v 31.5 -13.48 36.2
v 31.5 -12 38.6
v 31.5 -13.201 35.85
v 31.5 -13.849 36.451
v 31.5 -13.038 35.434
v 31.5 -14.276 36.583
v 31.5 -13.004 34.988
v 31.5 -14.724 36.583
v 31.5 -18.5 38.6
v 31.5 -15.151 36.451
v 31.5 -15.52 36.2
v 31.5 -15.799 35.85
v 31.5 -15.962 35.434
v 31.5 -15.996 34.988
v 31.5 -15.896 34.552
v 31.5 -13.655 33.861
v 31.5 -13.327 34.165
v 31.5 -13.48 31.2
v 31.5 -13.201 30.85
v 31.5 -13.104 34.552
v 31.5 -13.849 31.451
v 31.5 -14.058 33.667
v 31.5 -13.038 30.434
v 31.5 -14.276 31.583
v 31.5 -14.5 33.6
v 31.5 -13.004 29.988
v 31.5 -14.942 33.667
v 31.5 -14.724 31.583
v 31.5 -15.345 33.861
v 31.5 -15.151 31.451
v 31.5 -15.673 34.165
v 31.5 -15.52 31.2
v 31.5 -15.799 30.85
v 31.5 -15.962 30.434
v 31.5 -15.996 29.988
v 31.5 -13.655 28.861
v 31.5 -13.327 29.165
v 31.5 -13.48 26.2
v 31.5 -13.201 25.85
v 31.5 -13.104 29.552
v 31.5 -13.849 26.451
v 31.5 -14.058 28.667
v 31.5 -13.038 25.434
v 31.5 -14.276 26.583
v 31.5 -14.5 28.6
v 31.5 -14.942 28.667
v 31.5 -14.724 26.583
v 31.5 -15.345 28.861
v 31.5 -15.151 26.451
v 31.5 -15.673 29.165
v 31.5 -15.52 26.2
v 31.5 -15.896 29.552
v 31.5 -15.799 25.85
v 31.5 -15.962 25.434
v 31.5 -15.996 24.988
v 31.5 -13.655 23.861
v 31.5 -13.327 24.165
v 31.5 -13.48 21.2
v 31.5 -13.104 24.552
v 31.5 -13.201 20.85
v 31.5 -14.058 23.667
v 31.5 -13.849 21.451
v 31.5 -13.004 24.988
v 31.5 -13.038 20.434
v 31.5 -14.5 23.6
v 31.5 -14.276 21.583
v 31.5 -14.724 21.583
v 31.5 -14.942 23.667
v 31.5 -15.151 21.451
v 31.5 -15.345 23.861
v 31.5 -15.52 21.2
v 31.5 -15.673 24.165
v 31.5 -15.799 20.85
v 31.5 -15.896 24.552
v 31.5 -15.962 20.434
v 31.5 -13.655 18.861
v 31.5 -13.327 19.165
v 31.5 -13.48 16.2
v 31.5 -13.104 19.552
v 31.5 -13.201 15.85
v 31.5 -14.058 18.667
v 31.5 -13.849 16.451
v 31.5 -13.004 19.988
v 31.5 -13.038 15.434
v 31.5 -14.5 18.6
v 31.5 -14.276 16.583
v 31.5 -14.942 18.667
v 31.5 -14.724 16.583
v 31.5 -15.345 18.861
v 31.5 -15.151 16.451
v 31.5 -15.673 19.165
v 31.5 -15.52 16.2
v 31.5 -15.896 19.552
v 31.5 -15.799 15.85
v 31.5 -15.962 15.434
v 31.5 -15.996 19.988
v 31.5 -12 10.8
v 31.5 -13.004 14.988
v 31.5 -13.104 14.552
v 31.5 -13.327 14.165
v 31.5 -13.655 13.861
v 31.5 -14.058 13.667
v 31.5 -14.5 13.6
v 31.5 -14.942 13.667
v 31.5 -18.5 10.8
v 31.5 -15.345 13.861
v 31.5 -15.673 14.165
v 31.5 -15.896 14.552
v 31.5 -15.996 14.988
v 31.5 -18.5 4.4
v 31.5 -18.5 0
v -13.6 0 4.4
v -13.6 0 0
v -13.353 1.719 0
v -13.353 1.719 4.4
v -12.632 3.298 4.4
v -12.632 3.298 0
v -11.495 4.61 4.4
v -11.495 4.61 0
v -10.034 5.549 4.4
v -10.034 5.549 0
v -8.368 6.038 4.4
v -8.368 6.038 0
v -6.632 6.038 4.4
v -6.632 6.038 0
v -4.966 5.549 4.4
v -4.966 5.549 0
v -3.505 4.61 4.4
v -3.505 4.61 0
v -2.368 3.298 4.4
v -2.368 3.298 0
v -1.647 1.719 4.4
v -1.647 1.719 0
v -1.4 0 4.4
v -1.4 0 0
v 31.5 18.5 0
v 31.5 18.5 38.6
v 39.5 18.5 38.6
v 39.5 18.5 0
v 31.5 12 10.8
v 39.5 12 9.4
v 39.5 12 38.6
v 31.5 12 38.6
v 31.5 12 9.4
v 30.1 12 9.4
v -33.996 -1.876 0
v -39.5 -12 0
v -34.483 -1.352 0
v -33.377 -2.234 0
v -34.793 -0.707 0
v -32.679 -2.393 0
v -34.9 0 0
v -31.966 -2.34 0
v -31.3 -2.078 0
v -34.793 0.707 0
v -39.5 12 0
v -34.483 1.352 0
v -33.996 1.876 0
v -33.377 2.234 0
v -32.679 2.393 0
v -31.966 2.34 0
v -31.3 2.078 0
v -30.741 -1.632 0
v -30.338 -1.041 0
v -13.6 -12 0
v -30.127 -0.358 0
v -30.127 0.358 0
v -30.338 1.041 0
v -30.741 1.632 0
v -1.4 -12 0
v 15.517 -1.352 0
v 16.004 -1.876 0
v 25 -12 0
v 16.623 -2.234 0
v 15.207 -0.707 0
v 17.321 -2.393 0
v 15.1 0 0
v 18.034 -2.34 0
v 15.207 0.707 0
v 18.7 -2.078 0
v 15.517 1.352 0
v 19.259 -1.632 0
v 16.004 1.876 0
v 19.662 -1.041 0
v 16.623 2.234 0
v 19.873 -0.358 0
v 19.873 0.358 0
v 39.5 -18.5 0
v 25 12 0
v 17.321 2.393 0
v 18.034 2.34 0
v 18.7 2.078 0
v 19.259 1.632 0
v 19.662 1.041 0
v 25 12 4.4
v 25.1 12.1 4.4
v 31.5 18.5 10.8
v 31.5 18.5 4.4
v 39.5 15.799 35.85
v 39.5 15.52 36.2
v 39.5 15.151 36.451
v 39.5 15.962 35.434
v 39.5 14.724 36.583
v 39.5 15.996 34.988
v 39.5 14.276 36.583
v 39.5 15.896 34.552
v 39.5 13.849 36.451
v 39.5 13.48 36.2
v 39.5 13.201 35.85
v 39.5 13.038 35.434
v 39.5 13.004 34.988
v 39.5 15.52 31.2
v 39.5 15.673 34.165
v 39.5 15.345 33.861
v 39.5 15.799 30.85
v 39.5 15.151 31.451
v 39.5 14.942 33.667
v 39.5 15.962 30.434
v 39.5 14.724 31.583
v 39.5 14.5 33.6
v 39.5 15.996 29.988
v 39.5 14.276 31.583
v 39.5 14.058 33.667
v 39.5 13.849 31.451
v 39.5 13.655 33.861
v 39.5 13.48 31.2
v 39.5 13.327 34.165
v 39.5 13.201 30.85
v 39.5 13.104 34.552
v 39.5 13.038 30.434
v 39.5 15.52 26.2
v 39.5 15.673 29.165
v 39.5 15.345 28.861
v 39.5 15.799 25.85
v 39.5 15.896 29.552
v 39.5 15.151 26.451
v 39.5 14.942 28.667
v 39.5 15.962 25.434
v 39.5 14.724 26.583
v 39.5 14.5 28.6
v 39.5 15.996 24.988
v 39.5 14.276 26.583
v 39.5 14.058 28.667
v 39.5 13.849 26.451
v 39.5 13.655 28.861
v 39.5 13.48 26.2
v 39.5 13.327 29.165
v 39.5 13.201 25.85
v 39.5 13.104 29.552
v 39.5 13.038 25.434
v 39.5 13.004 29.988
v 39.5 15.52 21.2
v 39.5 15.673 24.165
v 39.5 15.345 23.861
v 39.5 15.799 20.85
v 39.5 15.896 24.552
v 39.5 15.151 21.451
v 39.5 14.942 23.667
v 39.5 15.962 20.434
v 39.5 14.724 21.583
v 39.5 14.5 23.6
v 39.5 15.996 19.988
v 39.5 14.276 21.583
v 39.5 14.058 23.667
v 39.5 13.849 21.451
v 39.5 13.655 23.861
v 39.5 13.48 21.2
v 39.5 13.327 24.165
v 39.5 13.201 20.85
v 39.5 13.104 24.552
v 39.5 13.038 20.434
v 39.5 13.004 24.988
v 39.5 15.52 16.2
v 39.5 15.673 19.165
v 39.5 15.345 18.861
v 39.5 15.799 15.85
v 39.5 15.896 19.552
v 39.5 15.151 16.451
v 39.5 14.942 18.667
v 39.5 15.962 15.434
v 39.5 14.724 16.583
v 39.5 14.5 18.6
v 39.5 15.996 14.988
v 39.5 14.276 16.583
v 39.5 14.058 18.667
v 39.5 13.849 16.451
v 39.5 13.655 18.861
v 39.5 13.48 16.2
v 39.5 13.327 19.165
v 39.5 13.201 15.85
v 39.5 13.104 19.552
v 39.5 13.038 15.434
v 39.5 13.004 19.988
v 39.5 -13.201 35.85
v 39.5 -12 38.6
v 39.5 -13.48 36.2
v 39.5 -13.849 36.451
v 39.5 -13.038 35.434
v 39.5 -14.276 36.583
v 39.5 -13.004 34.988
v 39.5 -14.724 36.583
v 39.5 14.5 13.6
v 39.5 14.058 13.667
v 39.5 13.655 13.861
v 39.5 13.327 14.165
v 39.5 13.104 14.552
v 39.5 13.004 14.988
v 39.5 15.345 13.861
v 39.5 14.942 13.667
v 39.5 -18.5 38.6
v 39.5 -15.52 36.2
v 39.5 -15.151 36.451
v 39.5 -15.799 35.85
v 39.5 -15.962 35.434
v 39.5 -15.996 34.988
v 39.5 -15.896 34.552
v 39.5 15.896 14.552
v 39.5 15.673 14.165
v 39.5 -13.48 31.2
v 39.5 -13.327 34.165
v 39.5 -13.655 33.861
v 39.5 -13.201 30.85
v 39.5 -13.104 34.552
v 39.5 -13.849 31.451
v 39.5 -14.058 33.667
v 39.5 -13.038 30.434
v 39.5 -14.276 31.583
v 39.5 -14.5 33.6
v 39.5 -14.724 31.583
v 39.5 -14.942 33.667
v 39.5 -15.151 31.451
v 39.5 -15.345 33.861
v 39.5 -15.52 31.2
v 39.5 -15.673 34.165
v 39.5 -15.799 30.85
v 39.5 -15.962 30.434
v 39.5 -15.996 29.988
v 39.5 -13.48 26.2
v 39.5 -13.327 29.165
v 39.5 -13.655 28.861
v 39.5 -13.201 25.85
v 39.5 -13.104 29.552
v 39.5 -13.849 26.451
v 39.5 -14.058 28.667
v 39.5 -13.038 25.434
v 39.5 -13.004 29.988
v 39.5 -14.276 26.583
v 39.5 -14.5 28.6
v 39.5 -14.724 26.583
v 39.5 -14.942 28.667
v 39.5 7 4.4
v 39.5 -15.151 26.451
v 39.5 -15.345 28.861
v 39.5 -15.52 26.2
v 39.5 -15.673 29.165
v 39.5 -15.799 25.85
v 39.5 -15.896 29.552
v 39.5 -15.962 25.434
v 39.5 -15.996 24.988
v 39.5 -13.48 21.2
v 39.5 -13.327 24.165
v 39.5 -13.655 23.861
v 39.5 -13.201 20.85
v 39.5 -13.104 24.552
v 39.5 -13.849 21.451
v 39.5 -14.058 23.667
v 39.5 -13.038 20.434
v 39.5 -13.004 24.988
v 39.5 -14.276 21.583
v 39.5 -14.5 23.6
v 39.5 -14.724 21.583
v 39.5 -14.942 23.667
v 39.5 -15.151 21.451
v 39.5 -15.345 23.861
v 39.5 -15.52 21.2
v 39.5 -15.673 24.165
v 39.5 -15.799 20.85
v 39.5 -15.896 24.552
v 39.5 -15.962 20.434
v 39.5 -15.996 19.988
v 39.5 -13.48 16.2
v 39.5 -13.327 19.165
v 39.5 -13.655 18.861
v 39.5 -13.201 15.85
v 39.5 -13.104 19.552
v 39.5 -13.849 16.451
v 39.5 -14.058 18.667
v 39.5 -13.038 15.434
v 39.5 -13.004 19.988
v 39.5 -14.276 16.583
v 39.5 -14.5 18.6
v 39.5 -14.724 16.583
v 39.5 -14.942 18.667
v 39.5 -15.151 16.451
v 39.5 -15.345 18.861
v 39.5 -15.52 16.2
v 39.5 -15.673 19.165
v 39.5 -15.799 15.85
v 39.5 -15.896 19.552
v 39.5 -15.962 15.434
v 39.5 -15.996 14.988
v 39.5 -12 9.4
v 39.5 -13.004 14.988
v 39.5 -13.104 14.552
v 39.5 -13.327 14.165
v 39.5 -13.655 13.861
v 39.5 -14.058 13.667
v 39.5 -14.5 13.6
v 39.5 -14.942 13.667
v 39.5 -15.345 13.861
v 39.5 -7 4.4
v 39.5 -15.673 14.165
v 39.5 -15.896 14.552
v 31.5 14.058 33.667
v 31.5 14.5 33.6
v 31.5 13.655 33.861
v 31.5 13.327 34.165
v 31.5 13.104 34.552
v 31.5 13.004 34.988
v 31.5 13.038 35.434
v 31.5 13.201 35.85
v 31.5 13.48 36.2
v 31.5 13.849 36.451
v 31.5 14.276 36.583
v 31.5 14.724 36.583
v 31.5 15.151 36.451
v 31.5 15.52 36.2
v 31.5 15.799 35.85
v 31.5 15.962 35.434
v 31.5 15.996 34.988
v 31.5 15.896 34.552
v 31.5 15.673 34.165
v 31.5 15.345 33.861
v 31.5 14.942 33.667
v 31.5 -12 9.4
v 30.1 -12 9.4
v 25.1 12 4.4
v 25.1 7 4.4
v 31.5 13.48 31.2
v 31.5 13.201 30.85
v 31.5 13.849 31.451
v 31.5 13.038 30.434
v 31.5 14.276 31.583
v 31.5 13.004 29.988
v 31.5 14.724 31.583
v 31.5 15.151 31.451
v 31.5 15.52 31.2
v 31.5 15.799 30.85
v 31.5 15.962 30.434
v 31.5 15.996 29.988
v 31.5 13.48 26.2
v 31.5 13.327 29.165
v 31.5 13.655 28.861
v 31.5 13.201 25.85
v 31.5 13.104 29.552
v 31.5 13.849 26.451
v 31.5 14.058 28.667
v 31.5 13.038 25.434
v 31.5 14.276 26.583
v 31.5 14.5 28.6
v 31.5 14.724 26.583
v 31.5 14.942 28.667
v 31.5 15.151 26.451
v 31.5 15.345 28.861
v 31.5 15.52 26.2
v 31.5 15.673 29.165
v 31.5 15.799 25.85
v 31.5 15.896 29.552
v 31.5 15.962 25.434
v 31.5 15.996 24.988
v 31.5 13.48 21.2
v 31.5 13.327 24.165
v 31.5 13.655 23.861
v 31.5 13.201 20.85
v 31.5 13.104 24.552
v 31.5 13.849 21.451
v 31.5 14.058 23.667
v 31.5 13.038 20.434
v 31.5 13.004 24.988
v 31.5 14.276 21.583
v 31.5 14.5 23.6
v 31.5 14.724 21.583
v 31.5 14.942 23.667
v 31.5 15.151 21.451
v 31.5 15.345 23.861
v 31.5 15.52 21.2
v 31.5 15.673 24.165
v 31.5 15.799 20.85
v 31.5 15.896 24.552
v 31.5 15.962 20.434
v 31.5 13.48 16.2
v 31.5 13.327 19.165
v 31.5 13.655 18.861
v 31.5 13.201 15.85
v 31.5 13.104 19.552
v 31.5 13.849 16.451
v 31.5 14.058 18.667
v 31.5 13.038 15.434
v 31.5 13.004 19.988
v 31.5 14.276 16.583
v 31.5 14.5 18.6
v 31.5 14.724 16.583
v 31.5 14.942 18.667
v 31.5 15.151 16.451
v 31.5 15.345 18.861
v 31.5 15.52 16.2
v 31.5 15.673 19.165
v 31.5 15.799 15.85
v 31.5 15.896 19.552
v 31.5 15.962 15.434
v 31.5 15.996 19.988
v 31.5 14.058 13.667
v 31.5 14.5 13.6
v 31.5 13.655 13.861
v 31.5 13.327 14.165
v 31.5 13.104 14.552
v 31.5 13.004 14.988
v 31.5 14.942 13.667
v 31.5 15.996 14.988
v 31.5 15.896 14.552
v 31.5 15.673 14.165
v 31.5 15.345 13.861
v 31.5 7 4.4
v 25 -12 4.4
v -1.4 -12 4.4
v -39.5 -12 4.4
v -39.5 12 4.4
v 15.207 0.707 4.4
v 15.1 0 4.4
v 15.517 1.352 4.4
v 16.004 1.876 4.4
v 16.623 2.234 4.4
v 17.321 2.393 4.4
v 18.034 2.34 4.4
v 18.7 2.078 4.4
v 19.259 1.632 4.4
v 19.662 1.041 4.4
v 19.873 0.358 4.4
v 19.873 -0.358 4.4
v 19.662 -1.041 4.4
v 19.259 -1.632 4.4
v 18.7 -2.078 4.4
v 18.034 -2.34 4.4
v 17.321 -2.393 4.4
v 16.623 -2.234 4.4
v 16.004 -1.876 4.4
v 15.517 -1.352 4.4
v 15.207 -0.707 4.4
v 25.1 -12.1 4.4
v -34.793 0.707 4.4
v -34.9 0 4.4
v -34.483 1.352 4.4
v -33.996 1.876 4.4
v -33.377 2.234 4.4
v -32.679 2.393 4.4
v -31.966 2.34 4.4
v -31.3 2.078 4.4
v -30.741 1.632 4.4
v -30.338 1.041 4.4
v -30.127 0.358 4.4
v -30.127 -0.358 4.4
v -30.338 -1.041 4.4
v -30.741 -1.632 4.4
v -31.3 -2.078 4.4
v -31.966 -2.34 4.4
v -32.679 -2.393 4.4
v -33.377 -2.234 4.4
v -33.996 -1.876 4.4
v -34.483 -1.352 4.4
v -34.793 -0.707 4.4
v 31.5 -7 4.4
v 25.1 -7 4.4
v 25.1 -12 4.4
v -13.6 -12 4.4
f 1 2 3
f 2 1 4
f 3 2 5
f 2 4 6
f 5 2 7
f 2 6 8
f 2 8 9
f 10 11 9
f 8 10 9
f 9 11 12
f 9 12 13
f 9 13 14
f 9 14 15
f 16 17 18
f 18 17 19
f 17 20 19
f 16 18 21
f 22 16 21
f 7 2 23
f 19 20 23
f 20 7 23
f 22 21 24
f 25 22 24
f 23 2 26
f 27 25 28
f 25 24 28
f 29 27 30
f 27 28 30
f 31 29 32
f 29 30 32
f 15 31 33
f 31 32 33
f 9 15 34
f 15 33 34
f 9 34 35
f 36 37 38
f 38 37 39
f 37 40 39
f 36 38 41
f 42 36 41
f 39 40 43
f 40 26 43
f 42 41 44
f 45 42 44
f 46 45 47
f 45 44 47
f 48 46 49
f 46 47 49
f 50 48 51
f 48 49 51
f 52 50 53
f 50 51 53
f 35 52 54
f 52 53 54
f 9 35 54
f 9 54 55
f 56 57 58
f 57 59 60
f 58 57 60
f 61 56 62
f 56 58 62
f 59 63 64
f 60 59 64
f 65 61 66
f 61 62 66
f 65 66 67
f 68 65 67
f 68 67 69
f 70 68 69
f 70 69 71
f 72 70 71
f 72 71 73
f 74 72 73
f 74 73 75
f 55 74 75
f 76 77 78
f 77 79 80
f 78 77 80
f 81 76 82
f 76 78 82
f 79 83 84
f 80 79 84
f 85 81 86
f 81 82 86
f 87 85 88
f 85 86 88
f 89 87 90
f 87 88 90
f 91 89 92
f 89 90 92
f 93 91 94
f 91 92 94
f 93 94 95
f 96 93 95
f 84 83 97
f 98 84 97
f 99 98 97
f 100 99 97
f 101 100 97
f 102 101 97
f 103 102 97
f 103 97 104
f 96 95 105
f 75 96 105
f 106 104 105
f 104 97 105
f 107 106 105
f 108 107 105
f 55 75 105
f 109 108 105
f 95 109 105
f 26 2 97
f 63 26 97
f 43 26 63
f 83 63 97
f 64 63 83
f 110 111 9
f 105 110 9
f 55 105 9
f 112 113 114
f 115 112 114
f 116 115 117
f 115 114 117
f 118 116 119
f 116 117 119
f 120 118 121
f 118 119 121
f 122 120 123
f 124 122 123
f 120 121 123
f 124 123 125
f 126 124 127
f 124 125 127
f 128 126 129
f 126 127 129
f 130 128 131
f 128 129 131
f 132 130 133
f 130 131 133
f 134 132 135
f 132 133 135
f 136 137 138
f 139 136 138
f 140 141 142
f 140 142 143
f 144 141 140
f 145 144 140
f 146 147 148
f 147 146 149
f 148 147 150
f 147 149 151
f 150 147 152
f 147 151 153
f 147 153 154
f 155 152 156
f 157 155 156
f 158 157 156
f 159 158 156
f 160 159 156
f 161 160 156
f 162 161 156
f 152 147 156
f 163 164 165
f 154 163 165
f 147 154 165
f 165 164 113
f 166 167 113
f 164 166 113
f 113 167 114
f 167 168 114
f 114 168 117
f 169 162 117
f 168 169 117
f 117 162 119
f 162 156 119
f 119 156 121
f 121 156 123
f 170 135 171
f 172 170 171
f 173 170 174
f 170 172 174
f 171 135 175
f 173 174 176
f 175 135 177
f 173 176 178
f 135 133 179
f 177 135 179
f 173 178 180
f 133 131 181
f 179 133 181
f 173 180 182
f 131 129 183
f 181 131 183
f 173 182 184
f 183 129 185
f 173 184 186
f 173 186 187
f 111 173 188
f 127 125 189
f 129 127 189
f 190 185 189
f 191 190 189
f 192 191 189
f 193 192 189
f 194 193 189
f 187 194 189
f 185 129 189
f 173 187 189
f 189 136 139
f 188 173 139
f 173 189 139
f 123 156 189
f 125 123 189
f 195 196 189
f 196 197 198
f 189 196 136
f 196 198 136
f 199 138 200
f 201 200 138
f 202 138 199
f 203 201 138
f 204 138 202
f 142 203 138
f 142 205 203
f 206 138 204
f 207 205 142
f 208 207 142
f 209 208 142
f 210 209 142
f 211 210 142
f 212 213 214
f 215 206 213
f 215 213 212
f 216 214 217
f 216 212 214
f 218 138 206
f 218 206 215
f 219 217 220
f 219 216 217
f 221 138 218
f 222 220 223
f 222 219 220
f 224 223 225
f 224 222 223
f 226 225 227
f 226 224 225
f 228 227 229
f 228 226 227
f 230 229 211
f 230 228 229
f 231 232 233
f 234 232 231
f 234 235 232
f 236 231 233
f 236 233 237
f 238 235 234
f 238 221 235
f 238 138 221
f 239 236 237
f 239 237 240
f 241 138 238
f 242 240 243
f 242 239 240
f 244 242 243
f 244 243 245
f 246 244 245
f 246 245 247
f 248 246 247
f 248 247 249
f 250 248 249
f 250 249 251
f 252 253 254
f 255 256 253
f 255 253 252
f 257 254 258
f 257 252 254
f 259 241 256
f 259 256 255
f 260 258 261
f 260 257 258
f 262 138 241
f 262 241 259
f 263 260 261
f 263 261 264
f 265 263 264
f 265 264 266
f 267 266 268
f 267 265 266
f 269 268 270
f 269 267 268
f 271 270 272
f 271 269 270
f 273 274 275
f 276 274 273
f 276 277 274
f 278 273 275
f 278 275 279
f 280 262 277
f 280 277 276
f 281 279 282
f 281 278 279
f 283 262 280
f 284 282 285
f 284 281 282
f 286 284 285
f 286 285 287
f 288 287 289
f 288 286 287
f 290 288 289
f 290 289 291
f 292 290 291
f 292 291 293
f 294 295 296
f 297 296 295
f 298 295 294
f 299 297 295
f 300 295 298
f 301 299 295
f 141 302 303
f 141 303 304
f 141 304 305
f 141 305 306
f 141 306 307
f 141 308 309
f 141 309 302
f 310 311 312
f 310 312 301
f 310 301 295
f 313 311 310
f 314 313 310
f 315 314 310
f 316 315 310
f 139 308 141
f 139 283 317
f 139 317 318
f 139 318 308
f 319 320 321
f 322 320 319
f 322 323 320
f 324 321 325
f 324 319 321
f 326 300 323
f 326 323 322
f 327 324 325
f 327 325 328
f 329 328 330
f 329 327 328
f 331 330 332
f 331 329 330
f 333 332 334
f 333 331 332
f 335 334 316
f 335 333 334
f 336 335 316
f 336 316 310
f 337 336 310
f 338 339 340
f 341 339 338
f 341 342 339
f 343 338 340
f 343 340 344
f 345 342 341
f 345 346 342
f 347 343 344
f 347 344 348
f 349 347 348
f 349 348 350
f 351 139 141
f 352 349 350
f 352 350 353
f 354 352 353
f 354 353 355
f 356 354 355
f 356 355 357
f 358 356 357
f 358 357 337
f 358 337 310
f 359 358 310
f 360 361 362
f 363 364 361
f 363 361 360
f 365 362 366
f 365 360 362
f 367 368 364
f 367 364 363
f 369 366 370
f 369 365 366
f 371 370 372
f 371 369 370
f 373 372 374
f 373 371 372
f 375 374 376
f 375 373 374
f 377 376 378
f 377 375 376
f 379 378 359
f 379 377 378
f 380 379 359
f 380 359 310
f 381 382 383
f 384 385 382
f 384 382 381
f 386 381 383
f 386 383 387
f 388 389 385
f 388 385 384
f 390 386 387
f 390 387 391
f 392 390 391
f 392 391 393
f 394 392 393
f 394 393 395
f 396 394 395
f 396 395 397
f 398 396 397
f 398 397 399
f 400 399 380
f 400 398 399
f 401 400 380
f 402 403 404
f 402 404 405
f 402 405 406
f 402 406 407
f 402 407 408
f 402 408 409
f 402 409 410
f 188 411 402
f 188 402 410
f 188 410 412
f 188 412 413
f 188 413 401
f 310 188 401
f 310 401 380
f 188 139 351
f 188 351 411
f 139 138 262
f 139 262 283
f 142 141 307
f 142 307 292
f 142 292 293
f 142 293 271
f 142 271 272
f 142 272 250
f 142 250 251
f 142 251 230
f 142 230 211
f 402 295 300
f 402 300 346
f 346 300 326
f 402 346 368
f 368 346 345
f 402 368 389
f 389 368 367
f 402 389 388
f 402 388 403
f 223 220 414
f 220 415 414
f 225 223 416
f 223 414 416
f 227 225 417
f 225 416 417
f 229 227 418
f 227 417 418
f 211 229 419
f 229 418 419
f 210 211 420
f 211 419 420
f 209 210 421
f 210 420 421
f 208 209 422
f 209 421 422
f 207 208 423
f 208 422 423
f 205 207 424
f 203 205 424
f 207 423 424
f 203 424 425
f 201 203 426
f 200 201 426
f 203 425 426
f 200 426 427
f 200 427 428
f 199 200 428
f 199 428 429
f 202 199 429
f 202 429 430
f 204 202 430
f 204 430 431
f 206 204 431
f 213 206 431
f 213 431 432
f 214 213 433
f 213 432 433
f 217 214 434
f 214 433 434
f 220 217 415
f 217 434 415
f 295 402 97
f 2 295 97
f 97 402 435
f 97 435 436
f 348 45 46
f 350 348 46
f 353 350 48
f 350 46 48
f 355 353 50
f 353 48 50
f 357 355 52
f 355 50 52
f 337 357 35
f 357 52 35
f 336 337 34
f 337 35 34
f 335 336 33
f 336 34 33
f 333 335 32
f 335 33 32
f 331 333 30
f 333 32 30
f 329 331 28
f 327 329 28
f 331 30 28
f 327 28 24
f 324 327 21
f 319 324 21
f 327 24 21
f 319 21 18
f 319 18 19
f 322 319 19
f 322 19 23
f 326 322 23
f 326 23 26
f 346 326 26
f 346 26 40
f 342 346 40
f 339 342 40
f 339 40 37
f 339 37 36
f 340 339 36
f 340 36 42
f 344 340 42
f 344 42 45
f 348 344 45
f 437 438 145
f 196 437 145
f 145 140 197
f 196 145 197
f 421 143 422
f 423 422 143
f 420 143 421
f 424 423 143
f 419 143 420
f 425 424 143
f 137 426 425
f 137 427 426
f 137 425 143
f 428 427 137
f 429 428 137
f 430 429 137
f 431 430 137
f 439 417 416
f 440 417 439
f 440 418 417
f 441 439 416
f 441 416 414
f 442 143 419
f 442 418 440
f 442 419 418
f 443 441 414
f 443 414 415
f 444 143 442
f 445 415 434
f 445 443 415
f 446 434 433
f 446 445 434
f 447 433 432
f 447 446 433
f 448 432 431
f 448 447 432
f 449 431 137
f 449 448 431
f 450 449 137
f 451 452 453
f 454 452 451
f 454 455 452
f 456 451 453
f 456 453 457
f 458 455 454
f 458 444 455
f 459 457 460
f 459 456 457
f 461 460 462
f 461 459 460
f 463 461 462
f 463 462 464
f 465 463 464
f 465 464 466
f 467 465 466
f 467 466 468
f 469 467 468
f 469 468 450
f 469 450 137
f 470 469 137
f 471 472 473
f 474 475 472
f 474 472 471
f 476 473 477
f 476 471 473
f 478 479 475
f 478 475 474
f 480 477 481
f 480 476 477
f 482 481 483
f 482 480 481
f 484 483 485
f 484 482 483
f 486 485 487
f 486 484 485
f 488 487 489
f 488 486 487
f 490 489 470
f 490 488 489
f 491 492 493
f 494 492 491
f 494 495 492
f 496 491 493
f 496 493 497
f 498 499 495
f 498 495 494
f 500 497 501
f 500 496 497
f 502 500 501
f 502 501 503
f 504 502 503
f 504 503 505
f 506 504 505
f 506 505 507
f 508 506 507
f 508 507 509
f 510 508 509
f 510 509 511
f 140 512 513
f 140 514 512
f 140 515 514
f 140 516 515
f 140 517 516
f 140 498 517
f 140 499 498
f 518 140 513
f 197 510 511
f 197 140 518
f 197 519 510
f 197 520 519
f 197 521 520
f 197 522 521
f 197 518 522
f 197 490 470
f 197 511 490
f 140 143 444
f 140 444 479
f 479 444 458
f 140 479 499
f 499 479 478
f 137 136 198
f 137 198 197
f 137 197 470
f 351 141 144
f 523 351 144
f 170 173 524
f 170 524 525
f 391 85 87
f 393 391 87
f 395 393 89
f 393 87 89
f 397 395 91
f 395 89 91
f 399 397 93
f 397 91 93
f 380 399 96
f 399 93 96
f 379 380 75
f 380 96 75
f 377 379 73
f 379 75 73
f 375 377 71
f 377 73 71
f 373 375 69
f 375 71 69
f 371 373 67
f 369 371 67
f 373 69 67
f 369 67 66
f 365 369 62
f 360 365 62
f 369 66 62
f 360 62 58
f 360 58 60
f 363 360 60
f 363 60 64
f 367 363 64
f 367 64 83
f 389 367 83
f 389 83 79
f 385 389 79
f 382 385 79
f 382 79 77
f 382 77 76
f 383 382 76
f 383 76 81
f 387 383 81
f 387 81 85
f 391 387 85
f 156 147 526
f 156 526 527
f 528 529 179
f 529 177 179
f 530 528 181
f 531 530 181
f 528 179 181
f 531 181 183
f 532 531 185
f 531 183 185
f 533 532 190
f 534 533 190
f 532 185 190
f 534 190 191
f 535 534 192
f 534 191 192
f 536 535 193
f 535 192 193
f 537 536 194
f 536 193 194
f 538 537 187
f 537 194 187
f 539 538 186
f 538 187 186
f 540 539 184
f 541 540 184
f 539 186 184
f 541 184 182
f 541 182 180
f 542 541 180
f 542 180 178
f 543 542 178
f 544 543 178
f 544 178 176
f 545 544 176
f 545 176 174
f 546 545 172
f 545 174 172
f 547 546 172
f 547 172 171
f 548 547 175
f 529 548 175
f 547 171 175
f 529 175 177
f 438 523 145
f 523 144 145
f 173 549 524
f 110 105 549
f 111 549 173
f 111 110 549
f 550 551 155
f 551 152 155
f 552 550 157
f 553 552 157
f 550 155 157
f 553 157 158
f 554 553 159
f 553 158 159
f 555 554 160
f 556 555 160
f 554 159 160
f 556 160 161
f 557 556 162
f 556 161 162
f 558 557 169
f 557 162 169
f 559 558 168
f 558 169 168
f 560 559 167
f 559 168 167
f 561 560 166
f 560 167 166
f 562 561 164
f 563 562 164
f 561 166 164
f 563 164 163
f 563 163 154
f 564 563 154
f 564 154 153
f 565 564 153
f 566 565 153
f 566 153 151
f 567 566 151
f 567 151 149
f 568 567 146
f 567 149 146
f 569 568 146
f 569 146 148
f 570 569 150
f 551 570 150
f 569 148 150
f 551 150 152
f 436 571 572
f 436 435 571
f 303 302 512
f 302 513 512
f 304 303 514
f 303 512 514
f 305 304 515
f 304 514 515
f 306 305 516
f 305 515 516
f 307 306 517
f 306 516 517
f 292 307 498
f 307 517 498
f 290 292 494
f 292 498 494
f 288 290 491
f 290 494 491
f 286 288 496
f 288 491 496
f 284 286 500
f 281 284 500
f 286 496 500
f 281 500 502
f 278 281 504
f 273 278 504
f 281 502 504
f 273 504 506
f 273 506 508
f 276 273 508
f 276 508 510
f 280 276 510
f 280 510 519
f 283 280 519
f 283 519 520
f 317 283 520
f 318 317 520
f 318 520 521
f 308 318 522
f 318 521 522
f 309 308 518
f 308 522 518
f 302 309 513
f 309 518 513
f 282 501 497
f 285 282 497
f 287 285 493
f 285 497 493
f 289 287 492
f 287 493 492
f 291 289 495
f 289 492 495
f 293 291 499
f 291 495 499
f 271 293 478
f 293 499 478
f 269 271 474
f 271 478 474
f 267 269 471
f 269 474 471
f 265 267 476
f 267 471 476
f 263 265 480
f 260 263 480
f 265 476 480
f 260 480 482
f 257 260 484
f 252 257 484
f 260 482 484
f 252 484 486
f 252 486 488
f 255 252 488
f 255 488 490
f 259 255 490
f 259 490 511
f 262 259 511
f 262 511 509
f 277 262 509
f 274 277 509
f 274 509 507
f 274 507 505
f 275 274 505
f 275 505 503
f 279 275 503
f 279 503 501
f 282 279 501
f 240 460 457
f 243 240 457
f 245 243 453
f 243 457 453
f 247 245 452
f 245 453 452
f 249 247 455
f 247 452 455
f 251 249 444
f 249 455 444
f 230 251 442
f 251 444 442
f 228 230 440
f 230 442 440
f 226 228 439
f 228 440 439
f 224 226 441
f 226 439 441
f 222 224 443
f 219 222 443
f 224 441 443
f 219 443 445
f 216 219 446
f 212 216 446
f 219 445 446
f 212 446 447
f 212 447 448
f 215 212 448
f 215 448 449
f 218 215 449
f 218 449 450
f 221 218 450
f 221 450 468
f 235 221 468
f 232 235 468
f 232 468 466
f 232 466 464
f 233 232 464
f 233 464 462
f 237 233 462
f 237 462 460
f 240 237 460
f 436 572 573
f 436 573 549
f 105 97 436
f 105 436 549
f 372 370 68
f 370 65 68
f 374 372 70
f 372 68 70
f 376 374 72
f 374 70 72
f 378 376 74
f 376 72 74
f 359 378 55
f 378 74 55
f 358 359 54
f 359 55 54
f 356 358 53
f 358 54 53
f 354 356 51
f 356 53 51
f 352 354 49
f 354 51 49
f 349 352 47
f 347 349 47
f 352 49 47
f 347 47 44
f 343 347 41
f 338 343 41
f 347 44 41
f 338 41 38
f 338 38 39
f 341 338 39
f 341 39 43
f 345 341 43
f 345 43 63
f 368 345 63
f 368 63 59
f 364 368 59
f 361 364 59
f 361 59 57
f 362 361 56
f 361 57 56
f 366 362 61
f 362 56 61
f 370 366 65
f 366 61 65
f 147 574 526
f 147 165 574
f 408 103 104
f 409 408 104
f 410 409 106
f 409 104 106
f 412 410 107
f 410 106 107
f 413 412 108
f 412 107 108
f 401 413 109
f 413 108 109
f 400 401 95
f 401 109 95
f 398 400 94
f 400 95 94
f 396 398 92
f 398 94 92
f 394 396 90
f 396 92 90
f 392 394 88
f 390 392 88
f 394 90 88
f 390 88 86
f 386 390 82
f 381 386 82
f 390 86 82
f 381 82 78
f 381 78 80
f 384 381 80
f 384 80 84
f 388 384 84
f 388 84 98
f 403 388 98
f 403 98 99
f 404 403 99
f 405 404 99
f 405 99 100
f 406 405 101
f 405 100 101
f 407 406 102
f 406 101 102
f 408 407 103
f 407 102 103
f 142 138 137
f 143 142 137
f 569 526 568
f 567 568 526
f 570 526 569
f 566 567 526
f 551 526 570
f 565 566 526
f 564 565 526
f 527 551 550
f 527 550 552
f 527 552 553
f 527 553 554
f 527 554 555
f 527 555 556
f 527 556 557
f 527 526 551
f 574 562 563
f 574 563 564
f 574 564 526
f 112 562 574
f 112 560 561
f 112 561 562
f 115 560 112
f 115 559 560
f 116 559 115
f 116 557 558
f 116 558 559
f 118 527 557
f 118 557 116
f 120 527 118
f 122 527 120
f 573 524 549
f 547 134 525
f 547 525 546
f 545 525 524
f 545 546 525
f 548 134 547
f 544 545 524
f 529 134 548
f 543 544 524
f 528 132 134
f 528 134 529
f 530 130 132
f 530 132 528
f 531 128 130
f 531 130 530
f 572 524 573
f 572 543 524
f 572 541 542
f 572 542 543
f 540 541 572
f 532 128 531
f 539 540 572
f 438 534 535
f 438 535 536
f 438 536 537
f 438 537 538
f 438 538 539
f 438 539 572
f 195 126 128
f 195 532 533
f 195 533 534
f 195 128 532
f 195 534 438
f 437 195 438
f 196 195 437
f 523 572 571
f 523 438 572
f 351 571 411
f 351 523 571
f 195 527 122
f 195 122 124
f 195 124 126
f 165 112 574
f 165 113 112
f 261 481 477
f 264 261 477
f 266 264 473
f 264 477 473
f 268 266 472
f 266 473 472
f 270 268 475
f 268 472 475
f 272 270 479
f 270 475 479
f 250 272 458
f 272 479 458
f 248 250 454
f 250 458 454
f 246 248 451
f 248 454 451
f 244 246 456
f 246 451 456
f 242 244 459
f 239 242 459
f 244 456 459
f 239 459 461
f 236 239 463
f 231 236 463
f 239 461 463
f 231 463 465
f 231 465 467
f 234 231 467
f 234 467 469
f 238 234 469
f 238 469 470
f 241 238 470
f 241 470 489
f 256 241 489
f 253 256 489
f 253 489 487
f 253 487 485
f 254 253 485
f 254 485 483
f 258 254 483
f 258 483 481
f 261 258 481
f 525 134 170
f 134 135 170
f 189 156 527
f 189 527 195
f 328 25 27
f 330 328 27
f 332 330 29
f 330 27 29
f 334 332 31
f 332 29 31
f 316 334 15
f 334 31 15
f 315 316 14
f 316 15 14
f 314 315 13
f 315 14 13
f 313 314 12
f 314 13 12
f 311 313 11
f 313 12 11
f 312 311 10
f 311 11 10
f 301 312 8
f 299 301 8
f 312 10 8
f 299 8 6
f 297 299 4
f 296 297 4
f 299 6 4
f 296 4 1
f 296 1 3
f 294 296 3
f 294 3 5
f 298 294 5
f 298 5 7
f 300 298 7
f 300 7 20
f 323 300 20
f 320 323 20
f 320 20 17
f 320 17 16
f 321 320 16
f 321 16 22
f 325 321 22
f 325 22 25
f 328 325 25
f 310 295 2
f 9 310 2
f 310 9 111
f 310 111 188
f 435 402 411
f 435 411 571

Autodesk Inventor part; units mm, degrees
ref_plane "YZ Plane" through (0, 0, 0) normal (1, 0, 0) x (0, 1, 0)
ref_plane "XZ Plane" through (0, 0, 0) normal (0, 1, 0) x (-1, 0, 0)
ref_plane "XY Plane" through (0, 0, 0) normal (0, 0, 1) x (1, 0, 0)
sketch "Sketch1" plane through (0, 0, 0) normal (0, 0, 1) x (1, 0, 0)
  line L0 (-39.5, 12) -> (39.5, 12)
  line L1 (39.5, 12) -> (39.5, -12)
  line L2 (39.5, -12) -> (-39.5, -12)
  line L3 (-39.5, -12) -> (-39.5, 12)
  line L4 (-39.5, 12) -> (39.5, -12) construction
  line L5 (39.5, 12) -> (-39.5, -12) construction
  point P0 (0, 0)
  dimension "d0" = 79
  dimension "d1" = 24
extrude "Extrusion1" add sketch "Sketch1" along normal blind 4.4
sketch "Sketch3" plane through (0, 0, 0) normal (0, 0, -1) x (-1, 0, 0)
  line L0 (-39.5, 12) -> (-31.5, 12)
  line L1 (-31.5, 12) -> (-31.5, 18.5)
  line L2 (-31.5, 18.5) -> (-39.5, 18.5)
  line L3 (-39.5, 18.5) -> (-39.5, 12)
  line L4 (-39.5, -12) -> (-31.5, -12)
  line L5 (-31.5, -12) -> (-31.5, -18.5)
  line L6 (-31.5, -18.5) -> (-39.5, -18.5)
  line L7 (-39.5, -18.5) -> (-39.5, -12)
  point P0 (0, 0)
  dimension "d8" = 8
  dimension "d9" = 6.5
  dimension "d10" = 6.5
extrude "Extrusion2" add sketch "Sketch3" against normal blind 38.6
chamfer "Chamfer1" distance 6.5 angle 45 2 edges at (31.5, -12, 2.2) (31.5, 12, 2.2)
sketch "Sketch5" plane through (0, 0, 0) normal (0, 0, -1) x (-1, 0, 0)
  line L0 (-25, -12) -> (39.5, -12) projected
  line L1 (39.5, 12) -> (-24.5, 12) construction
  line L2 (-24.5, 12) -> (-24.5, -12) construction
  line L3 (-24.5, -12) -> (39.5, -12) construction
  line L4 (39.5, -12) -> (39.5, 12) construction
  line L5 (-24.5, 12) -> (39.5, -12) construction
  line L6 (39.5, 12) -> (-24.5, -12) construction
  circle A0 centre (7.5, 0) radius 6.1
  line L7 (-17.5, 3) -> (32.5, 3) construction
  line L8 (32.5, 3) -> (32.5, -3) construction
  line L9 (32.5, -3) -> (-17.5, -3) construction
  line L10 (-17.5, -3) -> (-17.5, 3) construction
  line L11 (-17.5, 3) -> (32.5, -3) construction
  line L12 (32.5, 3) -> (-17.5, -3) construction
  circle A1 centre (-17.5, 0) radius 2.4
  circle A2 centre (32.5, 0) radius 2.4
  line L13 (1.4, 0) -> (1.4, -12)
  line L14 (13.6, 0) -> (13.6, -12)
  line L15 (13.6, -12) -> (1.4, -12)
  point P0 (0, 0)
  dimension "d29" = 64
  dimension "d30" = 12.2
  dimension "d31" = 50
  dimension "d32" = 4.8
  dimension "d33" = 4.8
extrude "Extrusion4" cut sketch "Sketch5" against normal blind 5.6
sketch "Sketch6" plane through (39.5, -18.5, 0) normal (1, 0, 0) x (0, 0, -1)
  line L0 (-38.6, 6.5) -> (-5.6, 6.5) construction
  line L1 (-5.6, 6.5) -> (-5.6, 1.5) construction
  line L2 (-5.6, 1.5) -> (-38.6, 1.5) construction
  line L3 (-38.6, 1.5) -> (-38.6, 6.5) construction
  line L4 (-38.6, 30.5) -> (-5.6, 30.5) construction
  line L5 (-5.6, 30.5) -> (-5.6, 35.5) construction
  line L6 (-5.6, 35.5) -> (-38.6, 35.5) construction
  line L7 (-38.6, 35.5) -> (-38.6, 30.5) construction
  line L8 (-38.6, 4) -> (-5.6, 4) construction
  line L9 (-38.6, 33) -> (-5.6, 33) construction
  line L10 (-38.6, 1.5) -> (-37.6, 1.5) construction
  line L11 (-37.6, 1.5) -> (-37.6, 6.5) construction
  line L12 (-37.6, 6.5) -> (-38.6, 6.5) construction
  line L13 (-38.6, 6.5) -> (-38.6, 1.5) construction
  line L14 (-37.6, 1.5) -> (-32.6, 1.5) construction
  line L15 (-32.6, 1.5) -> (-32.6, 6.5) construction
  line L16 (-32.6, 6.5) -> (-37.6, 6.5) construction
  line L17 (-37.6, 6.5) -> (-37.6, 1.5) construction
  line L18 (-38.6, 30.5) -> (-37.6, 30.5) construction
  line L19 (-37.6, 30.5) -> (-37.6, 35.5) construction
  line L20 (-37.6, 35.5) -> (-38.6, 35.5) construction
  line L21 (-38.6, 35.5) -> (-38.6, 30.5) construction
  line L22 (-37.6, 30.5) -> (-32.6, 30.5) construction
  line L23 (-32.6, 30.5) -> (-32.6, 35.5) construction
  line L24 (-32.6, 35.5) -> (-37.6, 35.5) construction
  line L25 (-37.6, 35.5) -> (-37.6, 30.5) construction
  line L26 (-37.6, 1.5) -> (-32.6, 6.5) construction
  line L27 (-37.6, 6.5) -> (-32.6, 1.5) construction
  line L28 (-37.6, 30.5) -> (-32.6, 35.5) construction
  line L29 (-37.6, 35.5) -> (-32.6, 30.5) construction
  line L30 (-38.6, 35.5) -> (-37.6, 35.5) construction
  line L31 (-37.6, 35.5) -> (-37.6, 30.5) construction
  line L32 (-37.6, 30.5) -> (-38.6, 30.5) construction
  line L33 (-38.6, 30.5) -> (-38.6, 35.5) construction
  line L34 (-4.4, 30.5) -> (-38.6, 30.5) projected
  line L35 (-32.6, 35.5) -> (-27.6, 35.5) construction
  line L36 (-27.6, 35.5) -> (-27.6, 30.5) construction
  line L37 (-27.6, 30.5) -> (-32.6, 30.5) construction
  line L38 (-32.6, 30.5) -> (-32.6, 35.5) construction
  line L39 (-27.6, 35.5) -> (-22.6, 35.5) construction
  line L40 (-22.6, 35.5) -> (-22.6, 30.5) construction
  line L41 (-22.6, 30.5) -> (-27.6, 30.5) construction
  line L42 (-27.6, 30.5) -> (-27.6, 35.5) construction
  line L43 (-32.6, 6.5) -> (-27.6, 6.5) construction
  line L44 (-27.6, 6.5) -> (-27.6, 1.5) construction
  line L45 (-27.6, 1.5) -> (-32.6, 1.5) construction
  line L46 (-32.6, 1.5) -> (-32.6, 6.5) construction
  line L47 (-27.6, 6.5) -> (-22.6, 6.5) construction
  line L48 (-22.6, 6.5) -> (-22.6, 1.5) construction
  line L49 (-22.6, 1.5) -> (-27.6, 1.5) construction
  line L50 (-27.6, 1.5) -> (-27.6, 6.5) construction
  line L51 (-22.6, 35.5) -> (-17.6, 35.5) construction
  line L52 (-17.6, 35.5) -> (-17.6, 30.5) construction
  line L53 (-17.6, 30.5) -> (-22.6, 30.5) construction
  line L54 (-22.6, 30.5) -> (-22.6, 35.5) construction
  line L55 (-22.6, 6.5) -> (-17.6, 6.5) construction
  line L56 (-17.6, 6.5) -> (-17.6, 1.5) construction
  line L57 (-17.6, 1.5) -> (-22.6, 1.5) construction
  line L58 (-22.6, 1.5) -> (-22.6, 6.5) construction
  line L59 (-17.6, 35.5) -> (-12.6, 35.5) construction
  line L60 (-12.6, 35.5) -> (-12.6, 30.5) construction
  line L61 (-12.6, 30.5) -> (-17.6, 30.5) construction
  line L62 (-17.6, 30.5) -> (-17.6, 35.5) construction
  line L63 (-17.6, 6.5) -> (-12.6, 6.5) construction
  line L64 (-12.6, 6.5) -> (-12.6, 1.5) construction
  line L65 (-12.6, 1.5) -> (-17.6, 1.5) construction
  line L66 (-17.6, 1.5) -> (-17.6, 6.5) construction
  line L67 (-32.6, 35.5) -> (-27.6, 30.5) construction
  line L68 (-27.6, 35.5) -> (-32.6, 30.5) construction
  line L69 (-27.6, 35.5) -> (-22.6, 30.5) construction
  line L70 (-27.6, 30.5) -> (-22.6, 35.5) construction
  line L71 (-22.6, 30.5) -> (-17.6, 35.5) construction
  line L72 (-22.6, 35.5) -> (-17.6, 30.5) construction
  line L73 (-17.6, 35.5) -> (-12.6, 30.5) construction
  line L74 (-12.6, 35.5) -> (-17.6, 30.5) construction
  line L75 (-17.6, 6.5) -> (-12.6, 1.5) construction
  line L76 (-12.6, 6.5) -> (-17.6, 1.5) construction
  line L77 (-22.6, 6.5) -> (-17.6, 1.5) construction
  line L78 (-17.6, 6.5) -> (-22.6, 1.5) construction
  line L79 (-27.6, 6.5) -> (-22.6, 1.5) construction
  line L80 (-22.6, 6.5) -> (-27.6, 1.5) construction
  line L81 (-32.6, 6.5) -> (-27.6, 1.5) construction
  line L82 (-27.6, 6.5) -> (-32.6, 1.5) construction
  point P0 (0, 18.5)
  point P1 (-35.1, 4)
  point P2 (-35.1, 33)
  point P3 (-30.1, 33)
  point P4 (-25.1, 33)
  point P5 (-20.1, 33)
  point P6 (-15.1, 33)
  point P7 (-15.1, 4)
  point P8 (-20.1, 4)
  point P9 (-25.1, 4)
  point P10 (-30.1, 4)
  dimension "d42" = 5
  dimension "d43" = 5
  dimension "d44" = 1
  dimension "d45" = 5
  dimension "d46" = 5
  dimension "d54" = 33
  dimension "d55" = 1
  dimension "d59" = 5
  dimension "d60" = 5
  dimension "d61" = 5
  dimension "d62" = 5
hole "Hole2" at (39.5, -14.5, 35.1) at (39.5, 14.5, 35.1) at (39.5, 14.5, 30.1) at (39.5, 14.5, 25.1) at (39.5, 14.5, 20.1) at (39.5, 14.5, 15.1) at (39.5, -14.5, 15.1) at (39.5, -14.5, 20.1) at (39.5, -14.5, 25.1) at (39.5, -14.5, 30.1) direction (-1, 0, 0) diameter 3 end through all
chamfer "Chamfer2" distance 6.4 angle 45 2 edges at (31.5, 15.25, 4.4) (31.5, -15.25, 4.4)
chamfer "Chamfer3" distance 5 angle 45 2 edges at (35.5, 12, 4.4) (35.5, -12, 4.4)
properties part number "Servo-Groove-Mount-J-Head"
